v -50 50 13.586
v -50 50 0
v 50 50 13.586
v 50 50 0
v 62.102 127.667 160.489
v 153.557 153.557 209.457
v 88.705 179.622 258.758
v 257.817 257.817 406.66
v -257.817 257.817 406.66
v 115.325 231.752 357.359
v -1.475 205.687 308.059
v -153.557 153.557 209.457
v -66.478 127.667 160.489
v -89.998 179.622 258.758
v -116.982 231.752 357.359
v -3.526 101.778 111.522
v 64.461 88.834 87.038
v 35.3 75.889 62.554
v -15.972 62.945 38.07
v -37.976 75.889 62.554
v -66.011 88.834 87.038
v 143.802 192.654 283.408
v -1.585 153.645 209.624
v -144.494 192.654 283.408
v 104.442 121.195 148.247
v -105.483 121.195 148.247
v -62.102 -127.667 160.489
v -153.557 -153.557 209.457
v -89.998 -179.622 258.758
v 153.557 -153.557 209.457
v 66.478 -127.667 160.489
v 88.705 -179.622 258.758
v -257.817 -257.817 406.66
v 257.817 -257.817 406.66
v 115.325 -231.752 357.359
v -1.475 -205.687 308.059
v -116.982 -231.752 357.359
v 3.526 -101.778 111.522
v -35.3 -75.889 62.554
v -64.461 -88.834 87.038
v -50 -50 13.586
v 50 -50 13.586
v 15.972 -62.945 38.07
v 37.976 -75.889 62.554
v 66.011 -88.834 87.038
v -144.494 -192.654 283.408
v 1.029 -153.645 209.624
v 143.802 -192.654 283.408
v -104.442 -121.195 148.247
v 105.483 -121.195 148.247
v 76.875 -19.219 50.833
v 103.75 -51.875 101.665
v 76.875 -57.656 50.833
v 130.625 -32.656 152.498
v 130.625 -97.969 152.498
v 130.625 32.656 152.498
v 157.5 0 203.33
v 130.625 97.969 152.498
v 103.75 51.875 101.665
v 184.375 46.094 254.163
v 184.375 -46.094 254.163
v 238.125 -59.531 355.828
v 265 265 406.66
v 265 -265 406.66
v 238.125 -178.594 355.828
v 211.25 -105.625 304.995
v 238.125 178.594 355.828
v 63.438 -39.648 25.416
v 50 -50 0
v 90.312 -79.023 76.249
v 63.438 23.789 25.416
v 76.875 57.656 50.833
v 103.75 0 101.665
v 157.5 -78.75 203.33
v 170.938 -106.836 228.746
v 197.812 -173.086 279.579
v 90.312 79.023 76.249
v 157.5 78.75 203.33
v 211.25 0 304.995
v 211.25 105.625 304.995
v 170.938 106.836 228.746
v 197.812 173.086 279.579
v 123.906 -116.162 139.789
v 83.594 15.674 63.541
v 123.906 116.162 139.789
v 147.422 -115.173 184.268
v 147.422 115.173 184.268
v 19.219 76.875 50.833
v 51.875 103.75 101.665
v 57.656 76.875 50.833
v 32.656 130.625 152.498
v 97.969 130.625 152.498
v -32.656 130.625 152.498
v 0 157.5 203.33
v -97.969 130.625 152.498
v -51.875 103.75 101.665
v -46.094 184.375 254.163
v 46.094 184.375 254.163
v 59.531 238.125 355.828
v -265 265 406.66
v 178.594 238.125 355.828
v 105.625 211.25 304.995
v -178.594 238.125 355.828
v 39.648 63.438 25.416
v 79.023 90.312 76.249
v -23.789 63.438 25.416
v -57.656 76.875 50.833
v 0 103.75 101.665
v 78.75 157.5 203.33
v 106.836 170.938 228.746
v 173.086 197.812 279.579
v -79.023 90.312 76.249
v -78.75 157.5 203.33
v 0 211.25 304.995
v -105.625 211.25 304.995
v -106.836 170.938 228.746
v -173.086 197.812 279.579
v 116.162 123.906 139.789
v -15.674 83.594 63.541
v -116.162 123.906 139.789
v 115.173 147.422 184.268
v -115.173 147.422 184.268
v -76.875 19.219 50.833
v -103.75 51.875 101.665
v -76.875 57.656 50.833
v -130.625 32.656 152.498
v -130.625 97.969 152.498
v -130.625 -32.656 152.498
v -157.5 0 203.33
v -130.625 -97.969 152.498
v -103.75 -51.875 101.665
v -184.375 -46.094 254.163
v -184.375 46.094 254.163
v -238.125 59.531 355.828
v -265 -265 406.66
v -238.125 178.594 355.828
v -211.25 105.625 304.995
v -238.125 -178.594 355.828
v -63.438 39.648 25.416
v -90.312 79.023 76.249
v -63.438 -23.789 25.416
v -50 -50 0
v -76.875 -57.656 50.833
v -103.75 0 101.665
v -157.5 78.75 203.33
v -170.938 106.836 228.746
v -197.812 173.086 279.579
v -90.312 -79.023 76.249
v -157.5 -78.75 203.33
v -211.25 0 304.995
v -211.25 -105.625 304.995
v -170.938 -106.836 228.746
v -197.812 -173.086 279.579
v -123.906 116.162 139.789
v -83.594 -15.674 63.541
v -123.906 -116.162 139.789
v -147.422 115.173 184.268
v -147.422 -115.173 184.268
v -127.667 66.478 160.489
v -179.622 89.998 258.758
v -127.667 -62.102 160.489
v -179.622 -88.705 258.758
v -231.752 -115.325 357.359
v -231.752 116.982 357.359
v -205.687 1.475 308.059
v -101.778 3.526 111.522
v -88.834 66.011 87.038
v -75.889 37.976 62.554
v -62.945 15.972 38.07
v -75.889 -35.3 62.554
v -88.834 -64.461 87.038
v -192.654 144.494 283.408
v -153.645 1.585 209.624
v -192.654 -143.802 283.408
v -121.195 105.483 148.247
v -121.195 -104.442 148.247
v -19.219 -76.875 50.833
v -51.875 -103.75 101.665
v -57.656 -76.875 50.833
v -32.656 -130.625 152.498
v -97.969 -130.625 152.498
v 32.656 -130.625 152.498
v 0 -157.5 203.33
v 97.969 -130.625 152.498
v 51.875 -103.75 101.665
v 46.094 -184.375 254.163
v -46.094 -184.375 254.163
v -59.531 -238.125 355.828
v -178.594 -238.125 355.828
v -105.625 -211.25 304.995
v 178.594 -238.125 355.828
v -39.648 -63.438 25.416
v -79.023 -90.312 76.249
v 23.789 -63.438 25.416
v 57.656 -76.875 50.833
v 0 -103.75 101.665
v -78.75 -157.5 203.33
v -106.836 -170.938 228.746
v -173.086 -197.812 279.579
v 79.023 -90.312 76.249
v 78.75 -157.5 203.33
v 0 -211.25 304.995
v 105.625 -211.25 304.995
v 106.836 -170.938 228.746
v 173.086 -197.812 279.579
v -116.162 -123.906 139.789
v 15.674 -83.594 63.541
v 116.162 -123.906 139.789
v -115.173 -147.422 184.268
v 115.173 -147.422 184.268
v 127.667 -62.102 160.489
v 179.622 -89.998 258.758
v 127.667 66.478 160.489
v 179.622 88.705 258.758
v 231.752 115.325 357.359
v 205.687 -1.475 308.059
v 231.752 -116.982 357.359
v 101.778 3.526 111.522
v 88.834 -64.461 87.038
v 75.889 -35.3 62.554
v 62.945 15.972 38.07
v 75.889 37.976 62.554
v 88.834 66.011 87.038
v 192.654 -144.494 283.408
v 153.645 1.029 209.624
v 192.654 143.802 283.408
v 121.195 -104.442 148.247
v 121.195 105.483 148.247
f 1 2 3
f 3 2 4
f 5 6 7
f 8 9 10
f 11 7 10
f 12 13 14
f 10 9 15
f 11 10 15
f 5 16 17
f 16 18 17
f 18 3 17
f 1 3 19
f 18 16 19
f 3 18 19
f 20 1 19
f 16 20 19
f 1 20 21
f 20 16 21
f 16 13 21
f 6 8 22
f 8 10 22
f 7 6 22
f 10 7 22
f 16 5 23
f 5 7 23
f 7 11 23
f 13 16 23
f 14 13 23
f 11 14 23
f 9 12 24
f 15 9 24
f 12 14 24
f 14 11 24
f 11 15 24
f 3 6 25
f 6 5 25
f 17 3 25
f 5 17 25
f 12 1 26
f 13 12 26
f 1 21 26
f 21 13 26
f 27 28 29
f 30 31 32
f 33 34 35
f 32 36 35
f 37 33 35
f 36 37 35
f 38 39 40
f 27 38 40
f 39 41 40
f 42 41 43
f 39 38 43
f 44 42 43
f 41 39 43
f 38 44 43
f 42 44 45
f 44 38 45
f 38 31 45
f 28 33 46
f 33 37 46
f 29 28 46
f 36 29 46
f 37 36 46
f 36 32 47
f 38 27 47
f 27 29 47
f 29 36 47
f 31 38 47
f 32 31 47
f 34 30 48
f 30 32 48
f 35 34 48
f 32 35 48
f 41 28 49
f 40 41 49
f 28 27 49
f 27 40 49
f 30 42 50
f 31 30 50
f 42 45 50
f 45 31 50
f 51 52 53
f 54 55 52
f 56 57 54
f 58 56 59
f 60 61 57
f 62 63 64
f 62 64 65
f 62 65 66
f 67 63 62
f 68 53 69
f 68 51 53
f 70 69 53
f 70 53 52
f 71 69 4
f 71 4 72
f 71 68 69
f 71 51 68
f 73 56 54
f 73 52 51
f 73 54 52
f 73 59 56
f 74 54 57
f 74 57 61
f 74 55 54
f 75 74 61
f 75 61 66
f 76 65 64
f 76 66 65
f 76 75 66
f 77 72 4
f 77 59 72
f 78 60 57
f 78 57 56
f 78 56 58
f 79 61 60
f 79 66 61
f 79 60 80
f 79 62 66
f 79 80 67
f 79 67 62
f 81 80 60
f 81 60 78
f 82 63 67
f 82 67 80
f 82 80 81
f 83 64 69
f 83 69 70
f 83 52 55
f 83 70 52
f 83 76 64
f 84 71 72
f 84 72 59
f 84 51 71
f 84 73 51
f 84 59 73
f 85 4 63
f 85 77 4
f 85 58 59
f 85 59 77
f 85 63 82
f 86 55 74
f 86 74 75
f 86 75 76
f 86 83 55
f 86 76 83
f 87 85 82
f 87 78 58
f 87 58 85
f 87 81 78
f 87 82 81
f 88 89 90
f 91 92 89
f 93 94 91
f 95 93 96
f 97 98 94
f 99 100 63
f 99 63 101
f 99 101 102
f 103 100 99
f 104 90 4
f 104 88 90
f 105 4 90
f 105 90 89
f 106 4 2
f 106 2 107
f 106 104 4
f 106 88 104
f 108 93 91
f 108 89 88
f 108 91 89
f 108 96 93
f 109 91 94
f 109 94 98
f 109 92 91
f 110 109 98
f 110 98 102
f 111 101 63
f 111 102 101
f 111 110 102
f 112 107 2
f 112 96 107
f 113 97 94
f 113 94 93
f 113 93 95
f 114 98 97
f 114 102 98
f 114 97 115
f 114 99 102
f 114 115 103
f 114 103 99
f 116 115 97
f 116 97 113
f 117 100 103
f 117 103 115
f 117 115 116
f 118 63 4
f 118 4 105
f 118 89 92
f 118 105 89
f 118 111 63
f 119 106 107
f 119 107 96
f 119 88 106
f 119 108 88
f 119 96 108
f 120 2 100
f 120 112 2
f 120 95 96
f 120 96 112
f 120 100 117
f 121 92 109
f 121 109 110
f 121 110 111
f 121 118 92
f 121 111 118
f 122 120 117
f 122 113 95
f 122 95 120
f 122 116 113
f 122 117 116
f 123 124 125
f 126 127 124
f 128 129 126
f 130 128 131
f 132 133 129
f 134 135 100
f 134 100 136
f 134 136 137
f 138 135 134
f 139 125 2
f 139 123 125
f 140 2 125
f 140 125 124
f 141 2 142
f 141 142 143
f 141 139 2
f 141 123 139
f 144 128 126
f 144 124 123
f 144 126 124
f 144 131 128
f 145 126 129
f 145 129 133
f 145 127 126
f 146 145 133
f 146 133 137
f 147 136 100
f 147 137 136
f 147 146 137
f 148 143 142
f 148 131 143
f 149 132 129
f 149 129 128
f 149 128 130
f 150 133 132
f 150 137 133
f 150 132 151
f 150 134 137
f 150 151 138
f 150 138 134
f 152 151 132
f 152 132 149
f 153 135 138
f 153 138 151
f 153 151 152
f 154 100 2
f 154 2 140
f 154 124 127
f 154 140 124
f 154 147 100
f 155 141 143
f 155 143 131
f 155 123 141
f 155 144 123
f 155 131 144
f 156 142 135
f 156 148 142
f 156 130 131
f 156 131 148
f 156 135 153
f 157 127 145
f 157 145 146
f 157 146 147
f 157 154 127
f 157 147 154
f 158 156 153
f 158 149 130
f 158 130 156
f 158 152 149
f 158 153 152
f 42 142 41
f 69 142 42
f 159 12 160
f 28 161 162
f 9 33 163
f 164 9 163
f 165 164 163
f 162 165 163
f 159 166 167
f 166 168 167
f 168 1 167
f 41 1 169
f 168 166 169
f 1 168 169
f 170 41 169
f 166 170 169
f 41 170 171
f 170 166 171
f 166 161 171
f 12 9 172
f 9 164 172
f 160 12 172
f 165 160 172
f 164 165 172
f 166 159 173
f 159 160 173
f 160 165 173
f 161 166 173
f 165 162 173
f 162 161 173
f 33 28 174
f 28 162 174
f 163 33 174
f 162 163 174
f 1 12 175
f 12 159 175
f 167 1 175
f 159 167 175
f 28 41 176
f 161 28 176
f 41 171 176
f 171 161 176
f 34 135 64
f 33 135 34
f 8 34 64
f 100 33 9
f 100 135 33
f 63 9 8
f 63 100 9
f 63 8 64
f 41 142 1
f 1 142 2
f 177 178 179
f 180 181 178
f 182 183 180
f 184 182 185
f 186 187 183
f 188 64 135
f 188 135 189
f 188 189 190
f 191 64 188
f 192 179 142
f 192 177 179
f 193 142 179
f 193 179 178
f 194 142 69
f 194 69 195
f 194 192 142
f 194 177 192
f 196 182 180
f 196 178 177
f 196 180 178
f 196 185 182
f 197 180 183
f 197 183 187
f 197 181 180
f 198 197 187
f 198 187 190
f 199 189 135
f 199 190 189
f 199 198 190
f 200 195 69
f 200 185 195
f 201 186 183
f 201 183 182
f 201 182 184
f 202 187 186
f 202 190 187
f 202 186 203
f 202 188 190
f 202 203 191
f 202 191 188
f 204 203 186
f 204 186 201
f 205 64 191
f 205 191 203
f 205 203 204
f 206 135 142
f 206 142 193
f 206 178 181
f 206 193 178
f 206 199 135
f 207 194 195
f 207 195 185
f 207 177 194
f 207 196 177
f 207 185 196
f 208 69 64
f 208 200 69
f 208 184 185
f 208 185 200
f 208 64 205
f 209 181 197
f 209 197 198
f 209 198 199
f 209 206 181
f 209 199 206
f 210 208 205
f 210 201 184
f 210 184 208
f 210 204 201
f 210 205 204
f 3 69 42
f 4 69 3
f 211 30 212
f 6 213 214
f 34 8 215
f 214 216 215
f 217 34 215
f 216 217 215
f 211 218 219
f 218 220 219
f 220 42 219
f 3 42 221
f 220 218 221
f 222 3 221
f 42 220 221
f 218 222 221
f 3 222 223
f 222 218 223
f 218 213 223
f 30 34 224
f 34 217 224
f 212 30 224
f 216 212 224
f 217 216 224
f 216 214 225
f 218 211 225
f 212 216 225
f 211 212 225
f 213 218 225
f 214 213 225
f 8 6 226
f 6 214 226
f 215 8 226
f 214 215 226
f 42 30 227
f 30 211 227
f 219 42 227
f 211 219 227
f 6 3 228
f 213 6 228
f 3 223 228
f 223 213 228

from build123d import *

# Parameters (mm, degrees)
F0_W     = 100
F0_H     = 100
F2_W     = 530
F2_H     = 530
F4_T     = -6.35
F5_DEPTH = 25.4


with BuildPart() as f3:
    # F0 (on Top) → F3 section 0
    with BuildSketch(Plane.XY):
        Rectangle(F0_W, F0_H)
    # F2 (on offset) → F3 section 1
    with BuildSketch(Plane.XY.offset(406.66)):
        Rectangle(F2_W, F2_H)
    loft()

    # F4
    f4_openings = [f3.faces().sort_by_distance(p)[0] for p in [
        (0, 0, 406.66),
    ]]
    offset(amount=F4_T, openings=f4_openings)

    # F5 (cut): a face of the model
    f5_faces = [f3.faces().sort_by_distance(p)[0] for p in [
        (0, 0, 0),
    ]]
    extrude(f5_faces, amount=-F5_DEPTH, mode=Mode.SUBTRACT)


solid = f3.part
